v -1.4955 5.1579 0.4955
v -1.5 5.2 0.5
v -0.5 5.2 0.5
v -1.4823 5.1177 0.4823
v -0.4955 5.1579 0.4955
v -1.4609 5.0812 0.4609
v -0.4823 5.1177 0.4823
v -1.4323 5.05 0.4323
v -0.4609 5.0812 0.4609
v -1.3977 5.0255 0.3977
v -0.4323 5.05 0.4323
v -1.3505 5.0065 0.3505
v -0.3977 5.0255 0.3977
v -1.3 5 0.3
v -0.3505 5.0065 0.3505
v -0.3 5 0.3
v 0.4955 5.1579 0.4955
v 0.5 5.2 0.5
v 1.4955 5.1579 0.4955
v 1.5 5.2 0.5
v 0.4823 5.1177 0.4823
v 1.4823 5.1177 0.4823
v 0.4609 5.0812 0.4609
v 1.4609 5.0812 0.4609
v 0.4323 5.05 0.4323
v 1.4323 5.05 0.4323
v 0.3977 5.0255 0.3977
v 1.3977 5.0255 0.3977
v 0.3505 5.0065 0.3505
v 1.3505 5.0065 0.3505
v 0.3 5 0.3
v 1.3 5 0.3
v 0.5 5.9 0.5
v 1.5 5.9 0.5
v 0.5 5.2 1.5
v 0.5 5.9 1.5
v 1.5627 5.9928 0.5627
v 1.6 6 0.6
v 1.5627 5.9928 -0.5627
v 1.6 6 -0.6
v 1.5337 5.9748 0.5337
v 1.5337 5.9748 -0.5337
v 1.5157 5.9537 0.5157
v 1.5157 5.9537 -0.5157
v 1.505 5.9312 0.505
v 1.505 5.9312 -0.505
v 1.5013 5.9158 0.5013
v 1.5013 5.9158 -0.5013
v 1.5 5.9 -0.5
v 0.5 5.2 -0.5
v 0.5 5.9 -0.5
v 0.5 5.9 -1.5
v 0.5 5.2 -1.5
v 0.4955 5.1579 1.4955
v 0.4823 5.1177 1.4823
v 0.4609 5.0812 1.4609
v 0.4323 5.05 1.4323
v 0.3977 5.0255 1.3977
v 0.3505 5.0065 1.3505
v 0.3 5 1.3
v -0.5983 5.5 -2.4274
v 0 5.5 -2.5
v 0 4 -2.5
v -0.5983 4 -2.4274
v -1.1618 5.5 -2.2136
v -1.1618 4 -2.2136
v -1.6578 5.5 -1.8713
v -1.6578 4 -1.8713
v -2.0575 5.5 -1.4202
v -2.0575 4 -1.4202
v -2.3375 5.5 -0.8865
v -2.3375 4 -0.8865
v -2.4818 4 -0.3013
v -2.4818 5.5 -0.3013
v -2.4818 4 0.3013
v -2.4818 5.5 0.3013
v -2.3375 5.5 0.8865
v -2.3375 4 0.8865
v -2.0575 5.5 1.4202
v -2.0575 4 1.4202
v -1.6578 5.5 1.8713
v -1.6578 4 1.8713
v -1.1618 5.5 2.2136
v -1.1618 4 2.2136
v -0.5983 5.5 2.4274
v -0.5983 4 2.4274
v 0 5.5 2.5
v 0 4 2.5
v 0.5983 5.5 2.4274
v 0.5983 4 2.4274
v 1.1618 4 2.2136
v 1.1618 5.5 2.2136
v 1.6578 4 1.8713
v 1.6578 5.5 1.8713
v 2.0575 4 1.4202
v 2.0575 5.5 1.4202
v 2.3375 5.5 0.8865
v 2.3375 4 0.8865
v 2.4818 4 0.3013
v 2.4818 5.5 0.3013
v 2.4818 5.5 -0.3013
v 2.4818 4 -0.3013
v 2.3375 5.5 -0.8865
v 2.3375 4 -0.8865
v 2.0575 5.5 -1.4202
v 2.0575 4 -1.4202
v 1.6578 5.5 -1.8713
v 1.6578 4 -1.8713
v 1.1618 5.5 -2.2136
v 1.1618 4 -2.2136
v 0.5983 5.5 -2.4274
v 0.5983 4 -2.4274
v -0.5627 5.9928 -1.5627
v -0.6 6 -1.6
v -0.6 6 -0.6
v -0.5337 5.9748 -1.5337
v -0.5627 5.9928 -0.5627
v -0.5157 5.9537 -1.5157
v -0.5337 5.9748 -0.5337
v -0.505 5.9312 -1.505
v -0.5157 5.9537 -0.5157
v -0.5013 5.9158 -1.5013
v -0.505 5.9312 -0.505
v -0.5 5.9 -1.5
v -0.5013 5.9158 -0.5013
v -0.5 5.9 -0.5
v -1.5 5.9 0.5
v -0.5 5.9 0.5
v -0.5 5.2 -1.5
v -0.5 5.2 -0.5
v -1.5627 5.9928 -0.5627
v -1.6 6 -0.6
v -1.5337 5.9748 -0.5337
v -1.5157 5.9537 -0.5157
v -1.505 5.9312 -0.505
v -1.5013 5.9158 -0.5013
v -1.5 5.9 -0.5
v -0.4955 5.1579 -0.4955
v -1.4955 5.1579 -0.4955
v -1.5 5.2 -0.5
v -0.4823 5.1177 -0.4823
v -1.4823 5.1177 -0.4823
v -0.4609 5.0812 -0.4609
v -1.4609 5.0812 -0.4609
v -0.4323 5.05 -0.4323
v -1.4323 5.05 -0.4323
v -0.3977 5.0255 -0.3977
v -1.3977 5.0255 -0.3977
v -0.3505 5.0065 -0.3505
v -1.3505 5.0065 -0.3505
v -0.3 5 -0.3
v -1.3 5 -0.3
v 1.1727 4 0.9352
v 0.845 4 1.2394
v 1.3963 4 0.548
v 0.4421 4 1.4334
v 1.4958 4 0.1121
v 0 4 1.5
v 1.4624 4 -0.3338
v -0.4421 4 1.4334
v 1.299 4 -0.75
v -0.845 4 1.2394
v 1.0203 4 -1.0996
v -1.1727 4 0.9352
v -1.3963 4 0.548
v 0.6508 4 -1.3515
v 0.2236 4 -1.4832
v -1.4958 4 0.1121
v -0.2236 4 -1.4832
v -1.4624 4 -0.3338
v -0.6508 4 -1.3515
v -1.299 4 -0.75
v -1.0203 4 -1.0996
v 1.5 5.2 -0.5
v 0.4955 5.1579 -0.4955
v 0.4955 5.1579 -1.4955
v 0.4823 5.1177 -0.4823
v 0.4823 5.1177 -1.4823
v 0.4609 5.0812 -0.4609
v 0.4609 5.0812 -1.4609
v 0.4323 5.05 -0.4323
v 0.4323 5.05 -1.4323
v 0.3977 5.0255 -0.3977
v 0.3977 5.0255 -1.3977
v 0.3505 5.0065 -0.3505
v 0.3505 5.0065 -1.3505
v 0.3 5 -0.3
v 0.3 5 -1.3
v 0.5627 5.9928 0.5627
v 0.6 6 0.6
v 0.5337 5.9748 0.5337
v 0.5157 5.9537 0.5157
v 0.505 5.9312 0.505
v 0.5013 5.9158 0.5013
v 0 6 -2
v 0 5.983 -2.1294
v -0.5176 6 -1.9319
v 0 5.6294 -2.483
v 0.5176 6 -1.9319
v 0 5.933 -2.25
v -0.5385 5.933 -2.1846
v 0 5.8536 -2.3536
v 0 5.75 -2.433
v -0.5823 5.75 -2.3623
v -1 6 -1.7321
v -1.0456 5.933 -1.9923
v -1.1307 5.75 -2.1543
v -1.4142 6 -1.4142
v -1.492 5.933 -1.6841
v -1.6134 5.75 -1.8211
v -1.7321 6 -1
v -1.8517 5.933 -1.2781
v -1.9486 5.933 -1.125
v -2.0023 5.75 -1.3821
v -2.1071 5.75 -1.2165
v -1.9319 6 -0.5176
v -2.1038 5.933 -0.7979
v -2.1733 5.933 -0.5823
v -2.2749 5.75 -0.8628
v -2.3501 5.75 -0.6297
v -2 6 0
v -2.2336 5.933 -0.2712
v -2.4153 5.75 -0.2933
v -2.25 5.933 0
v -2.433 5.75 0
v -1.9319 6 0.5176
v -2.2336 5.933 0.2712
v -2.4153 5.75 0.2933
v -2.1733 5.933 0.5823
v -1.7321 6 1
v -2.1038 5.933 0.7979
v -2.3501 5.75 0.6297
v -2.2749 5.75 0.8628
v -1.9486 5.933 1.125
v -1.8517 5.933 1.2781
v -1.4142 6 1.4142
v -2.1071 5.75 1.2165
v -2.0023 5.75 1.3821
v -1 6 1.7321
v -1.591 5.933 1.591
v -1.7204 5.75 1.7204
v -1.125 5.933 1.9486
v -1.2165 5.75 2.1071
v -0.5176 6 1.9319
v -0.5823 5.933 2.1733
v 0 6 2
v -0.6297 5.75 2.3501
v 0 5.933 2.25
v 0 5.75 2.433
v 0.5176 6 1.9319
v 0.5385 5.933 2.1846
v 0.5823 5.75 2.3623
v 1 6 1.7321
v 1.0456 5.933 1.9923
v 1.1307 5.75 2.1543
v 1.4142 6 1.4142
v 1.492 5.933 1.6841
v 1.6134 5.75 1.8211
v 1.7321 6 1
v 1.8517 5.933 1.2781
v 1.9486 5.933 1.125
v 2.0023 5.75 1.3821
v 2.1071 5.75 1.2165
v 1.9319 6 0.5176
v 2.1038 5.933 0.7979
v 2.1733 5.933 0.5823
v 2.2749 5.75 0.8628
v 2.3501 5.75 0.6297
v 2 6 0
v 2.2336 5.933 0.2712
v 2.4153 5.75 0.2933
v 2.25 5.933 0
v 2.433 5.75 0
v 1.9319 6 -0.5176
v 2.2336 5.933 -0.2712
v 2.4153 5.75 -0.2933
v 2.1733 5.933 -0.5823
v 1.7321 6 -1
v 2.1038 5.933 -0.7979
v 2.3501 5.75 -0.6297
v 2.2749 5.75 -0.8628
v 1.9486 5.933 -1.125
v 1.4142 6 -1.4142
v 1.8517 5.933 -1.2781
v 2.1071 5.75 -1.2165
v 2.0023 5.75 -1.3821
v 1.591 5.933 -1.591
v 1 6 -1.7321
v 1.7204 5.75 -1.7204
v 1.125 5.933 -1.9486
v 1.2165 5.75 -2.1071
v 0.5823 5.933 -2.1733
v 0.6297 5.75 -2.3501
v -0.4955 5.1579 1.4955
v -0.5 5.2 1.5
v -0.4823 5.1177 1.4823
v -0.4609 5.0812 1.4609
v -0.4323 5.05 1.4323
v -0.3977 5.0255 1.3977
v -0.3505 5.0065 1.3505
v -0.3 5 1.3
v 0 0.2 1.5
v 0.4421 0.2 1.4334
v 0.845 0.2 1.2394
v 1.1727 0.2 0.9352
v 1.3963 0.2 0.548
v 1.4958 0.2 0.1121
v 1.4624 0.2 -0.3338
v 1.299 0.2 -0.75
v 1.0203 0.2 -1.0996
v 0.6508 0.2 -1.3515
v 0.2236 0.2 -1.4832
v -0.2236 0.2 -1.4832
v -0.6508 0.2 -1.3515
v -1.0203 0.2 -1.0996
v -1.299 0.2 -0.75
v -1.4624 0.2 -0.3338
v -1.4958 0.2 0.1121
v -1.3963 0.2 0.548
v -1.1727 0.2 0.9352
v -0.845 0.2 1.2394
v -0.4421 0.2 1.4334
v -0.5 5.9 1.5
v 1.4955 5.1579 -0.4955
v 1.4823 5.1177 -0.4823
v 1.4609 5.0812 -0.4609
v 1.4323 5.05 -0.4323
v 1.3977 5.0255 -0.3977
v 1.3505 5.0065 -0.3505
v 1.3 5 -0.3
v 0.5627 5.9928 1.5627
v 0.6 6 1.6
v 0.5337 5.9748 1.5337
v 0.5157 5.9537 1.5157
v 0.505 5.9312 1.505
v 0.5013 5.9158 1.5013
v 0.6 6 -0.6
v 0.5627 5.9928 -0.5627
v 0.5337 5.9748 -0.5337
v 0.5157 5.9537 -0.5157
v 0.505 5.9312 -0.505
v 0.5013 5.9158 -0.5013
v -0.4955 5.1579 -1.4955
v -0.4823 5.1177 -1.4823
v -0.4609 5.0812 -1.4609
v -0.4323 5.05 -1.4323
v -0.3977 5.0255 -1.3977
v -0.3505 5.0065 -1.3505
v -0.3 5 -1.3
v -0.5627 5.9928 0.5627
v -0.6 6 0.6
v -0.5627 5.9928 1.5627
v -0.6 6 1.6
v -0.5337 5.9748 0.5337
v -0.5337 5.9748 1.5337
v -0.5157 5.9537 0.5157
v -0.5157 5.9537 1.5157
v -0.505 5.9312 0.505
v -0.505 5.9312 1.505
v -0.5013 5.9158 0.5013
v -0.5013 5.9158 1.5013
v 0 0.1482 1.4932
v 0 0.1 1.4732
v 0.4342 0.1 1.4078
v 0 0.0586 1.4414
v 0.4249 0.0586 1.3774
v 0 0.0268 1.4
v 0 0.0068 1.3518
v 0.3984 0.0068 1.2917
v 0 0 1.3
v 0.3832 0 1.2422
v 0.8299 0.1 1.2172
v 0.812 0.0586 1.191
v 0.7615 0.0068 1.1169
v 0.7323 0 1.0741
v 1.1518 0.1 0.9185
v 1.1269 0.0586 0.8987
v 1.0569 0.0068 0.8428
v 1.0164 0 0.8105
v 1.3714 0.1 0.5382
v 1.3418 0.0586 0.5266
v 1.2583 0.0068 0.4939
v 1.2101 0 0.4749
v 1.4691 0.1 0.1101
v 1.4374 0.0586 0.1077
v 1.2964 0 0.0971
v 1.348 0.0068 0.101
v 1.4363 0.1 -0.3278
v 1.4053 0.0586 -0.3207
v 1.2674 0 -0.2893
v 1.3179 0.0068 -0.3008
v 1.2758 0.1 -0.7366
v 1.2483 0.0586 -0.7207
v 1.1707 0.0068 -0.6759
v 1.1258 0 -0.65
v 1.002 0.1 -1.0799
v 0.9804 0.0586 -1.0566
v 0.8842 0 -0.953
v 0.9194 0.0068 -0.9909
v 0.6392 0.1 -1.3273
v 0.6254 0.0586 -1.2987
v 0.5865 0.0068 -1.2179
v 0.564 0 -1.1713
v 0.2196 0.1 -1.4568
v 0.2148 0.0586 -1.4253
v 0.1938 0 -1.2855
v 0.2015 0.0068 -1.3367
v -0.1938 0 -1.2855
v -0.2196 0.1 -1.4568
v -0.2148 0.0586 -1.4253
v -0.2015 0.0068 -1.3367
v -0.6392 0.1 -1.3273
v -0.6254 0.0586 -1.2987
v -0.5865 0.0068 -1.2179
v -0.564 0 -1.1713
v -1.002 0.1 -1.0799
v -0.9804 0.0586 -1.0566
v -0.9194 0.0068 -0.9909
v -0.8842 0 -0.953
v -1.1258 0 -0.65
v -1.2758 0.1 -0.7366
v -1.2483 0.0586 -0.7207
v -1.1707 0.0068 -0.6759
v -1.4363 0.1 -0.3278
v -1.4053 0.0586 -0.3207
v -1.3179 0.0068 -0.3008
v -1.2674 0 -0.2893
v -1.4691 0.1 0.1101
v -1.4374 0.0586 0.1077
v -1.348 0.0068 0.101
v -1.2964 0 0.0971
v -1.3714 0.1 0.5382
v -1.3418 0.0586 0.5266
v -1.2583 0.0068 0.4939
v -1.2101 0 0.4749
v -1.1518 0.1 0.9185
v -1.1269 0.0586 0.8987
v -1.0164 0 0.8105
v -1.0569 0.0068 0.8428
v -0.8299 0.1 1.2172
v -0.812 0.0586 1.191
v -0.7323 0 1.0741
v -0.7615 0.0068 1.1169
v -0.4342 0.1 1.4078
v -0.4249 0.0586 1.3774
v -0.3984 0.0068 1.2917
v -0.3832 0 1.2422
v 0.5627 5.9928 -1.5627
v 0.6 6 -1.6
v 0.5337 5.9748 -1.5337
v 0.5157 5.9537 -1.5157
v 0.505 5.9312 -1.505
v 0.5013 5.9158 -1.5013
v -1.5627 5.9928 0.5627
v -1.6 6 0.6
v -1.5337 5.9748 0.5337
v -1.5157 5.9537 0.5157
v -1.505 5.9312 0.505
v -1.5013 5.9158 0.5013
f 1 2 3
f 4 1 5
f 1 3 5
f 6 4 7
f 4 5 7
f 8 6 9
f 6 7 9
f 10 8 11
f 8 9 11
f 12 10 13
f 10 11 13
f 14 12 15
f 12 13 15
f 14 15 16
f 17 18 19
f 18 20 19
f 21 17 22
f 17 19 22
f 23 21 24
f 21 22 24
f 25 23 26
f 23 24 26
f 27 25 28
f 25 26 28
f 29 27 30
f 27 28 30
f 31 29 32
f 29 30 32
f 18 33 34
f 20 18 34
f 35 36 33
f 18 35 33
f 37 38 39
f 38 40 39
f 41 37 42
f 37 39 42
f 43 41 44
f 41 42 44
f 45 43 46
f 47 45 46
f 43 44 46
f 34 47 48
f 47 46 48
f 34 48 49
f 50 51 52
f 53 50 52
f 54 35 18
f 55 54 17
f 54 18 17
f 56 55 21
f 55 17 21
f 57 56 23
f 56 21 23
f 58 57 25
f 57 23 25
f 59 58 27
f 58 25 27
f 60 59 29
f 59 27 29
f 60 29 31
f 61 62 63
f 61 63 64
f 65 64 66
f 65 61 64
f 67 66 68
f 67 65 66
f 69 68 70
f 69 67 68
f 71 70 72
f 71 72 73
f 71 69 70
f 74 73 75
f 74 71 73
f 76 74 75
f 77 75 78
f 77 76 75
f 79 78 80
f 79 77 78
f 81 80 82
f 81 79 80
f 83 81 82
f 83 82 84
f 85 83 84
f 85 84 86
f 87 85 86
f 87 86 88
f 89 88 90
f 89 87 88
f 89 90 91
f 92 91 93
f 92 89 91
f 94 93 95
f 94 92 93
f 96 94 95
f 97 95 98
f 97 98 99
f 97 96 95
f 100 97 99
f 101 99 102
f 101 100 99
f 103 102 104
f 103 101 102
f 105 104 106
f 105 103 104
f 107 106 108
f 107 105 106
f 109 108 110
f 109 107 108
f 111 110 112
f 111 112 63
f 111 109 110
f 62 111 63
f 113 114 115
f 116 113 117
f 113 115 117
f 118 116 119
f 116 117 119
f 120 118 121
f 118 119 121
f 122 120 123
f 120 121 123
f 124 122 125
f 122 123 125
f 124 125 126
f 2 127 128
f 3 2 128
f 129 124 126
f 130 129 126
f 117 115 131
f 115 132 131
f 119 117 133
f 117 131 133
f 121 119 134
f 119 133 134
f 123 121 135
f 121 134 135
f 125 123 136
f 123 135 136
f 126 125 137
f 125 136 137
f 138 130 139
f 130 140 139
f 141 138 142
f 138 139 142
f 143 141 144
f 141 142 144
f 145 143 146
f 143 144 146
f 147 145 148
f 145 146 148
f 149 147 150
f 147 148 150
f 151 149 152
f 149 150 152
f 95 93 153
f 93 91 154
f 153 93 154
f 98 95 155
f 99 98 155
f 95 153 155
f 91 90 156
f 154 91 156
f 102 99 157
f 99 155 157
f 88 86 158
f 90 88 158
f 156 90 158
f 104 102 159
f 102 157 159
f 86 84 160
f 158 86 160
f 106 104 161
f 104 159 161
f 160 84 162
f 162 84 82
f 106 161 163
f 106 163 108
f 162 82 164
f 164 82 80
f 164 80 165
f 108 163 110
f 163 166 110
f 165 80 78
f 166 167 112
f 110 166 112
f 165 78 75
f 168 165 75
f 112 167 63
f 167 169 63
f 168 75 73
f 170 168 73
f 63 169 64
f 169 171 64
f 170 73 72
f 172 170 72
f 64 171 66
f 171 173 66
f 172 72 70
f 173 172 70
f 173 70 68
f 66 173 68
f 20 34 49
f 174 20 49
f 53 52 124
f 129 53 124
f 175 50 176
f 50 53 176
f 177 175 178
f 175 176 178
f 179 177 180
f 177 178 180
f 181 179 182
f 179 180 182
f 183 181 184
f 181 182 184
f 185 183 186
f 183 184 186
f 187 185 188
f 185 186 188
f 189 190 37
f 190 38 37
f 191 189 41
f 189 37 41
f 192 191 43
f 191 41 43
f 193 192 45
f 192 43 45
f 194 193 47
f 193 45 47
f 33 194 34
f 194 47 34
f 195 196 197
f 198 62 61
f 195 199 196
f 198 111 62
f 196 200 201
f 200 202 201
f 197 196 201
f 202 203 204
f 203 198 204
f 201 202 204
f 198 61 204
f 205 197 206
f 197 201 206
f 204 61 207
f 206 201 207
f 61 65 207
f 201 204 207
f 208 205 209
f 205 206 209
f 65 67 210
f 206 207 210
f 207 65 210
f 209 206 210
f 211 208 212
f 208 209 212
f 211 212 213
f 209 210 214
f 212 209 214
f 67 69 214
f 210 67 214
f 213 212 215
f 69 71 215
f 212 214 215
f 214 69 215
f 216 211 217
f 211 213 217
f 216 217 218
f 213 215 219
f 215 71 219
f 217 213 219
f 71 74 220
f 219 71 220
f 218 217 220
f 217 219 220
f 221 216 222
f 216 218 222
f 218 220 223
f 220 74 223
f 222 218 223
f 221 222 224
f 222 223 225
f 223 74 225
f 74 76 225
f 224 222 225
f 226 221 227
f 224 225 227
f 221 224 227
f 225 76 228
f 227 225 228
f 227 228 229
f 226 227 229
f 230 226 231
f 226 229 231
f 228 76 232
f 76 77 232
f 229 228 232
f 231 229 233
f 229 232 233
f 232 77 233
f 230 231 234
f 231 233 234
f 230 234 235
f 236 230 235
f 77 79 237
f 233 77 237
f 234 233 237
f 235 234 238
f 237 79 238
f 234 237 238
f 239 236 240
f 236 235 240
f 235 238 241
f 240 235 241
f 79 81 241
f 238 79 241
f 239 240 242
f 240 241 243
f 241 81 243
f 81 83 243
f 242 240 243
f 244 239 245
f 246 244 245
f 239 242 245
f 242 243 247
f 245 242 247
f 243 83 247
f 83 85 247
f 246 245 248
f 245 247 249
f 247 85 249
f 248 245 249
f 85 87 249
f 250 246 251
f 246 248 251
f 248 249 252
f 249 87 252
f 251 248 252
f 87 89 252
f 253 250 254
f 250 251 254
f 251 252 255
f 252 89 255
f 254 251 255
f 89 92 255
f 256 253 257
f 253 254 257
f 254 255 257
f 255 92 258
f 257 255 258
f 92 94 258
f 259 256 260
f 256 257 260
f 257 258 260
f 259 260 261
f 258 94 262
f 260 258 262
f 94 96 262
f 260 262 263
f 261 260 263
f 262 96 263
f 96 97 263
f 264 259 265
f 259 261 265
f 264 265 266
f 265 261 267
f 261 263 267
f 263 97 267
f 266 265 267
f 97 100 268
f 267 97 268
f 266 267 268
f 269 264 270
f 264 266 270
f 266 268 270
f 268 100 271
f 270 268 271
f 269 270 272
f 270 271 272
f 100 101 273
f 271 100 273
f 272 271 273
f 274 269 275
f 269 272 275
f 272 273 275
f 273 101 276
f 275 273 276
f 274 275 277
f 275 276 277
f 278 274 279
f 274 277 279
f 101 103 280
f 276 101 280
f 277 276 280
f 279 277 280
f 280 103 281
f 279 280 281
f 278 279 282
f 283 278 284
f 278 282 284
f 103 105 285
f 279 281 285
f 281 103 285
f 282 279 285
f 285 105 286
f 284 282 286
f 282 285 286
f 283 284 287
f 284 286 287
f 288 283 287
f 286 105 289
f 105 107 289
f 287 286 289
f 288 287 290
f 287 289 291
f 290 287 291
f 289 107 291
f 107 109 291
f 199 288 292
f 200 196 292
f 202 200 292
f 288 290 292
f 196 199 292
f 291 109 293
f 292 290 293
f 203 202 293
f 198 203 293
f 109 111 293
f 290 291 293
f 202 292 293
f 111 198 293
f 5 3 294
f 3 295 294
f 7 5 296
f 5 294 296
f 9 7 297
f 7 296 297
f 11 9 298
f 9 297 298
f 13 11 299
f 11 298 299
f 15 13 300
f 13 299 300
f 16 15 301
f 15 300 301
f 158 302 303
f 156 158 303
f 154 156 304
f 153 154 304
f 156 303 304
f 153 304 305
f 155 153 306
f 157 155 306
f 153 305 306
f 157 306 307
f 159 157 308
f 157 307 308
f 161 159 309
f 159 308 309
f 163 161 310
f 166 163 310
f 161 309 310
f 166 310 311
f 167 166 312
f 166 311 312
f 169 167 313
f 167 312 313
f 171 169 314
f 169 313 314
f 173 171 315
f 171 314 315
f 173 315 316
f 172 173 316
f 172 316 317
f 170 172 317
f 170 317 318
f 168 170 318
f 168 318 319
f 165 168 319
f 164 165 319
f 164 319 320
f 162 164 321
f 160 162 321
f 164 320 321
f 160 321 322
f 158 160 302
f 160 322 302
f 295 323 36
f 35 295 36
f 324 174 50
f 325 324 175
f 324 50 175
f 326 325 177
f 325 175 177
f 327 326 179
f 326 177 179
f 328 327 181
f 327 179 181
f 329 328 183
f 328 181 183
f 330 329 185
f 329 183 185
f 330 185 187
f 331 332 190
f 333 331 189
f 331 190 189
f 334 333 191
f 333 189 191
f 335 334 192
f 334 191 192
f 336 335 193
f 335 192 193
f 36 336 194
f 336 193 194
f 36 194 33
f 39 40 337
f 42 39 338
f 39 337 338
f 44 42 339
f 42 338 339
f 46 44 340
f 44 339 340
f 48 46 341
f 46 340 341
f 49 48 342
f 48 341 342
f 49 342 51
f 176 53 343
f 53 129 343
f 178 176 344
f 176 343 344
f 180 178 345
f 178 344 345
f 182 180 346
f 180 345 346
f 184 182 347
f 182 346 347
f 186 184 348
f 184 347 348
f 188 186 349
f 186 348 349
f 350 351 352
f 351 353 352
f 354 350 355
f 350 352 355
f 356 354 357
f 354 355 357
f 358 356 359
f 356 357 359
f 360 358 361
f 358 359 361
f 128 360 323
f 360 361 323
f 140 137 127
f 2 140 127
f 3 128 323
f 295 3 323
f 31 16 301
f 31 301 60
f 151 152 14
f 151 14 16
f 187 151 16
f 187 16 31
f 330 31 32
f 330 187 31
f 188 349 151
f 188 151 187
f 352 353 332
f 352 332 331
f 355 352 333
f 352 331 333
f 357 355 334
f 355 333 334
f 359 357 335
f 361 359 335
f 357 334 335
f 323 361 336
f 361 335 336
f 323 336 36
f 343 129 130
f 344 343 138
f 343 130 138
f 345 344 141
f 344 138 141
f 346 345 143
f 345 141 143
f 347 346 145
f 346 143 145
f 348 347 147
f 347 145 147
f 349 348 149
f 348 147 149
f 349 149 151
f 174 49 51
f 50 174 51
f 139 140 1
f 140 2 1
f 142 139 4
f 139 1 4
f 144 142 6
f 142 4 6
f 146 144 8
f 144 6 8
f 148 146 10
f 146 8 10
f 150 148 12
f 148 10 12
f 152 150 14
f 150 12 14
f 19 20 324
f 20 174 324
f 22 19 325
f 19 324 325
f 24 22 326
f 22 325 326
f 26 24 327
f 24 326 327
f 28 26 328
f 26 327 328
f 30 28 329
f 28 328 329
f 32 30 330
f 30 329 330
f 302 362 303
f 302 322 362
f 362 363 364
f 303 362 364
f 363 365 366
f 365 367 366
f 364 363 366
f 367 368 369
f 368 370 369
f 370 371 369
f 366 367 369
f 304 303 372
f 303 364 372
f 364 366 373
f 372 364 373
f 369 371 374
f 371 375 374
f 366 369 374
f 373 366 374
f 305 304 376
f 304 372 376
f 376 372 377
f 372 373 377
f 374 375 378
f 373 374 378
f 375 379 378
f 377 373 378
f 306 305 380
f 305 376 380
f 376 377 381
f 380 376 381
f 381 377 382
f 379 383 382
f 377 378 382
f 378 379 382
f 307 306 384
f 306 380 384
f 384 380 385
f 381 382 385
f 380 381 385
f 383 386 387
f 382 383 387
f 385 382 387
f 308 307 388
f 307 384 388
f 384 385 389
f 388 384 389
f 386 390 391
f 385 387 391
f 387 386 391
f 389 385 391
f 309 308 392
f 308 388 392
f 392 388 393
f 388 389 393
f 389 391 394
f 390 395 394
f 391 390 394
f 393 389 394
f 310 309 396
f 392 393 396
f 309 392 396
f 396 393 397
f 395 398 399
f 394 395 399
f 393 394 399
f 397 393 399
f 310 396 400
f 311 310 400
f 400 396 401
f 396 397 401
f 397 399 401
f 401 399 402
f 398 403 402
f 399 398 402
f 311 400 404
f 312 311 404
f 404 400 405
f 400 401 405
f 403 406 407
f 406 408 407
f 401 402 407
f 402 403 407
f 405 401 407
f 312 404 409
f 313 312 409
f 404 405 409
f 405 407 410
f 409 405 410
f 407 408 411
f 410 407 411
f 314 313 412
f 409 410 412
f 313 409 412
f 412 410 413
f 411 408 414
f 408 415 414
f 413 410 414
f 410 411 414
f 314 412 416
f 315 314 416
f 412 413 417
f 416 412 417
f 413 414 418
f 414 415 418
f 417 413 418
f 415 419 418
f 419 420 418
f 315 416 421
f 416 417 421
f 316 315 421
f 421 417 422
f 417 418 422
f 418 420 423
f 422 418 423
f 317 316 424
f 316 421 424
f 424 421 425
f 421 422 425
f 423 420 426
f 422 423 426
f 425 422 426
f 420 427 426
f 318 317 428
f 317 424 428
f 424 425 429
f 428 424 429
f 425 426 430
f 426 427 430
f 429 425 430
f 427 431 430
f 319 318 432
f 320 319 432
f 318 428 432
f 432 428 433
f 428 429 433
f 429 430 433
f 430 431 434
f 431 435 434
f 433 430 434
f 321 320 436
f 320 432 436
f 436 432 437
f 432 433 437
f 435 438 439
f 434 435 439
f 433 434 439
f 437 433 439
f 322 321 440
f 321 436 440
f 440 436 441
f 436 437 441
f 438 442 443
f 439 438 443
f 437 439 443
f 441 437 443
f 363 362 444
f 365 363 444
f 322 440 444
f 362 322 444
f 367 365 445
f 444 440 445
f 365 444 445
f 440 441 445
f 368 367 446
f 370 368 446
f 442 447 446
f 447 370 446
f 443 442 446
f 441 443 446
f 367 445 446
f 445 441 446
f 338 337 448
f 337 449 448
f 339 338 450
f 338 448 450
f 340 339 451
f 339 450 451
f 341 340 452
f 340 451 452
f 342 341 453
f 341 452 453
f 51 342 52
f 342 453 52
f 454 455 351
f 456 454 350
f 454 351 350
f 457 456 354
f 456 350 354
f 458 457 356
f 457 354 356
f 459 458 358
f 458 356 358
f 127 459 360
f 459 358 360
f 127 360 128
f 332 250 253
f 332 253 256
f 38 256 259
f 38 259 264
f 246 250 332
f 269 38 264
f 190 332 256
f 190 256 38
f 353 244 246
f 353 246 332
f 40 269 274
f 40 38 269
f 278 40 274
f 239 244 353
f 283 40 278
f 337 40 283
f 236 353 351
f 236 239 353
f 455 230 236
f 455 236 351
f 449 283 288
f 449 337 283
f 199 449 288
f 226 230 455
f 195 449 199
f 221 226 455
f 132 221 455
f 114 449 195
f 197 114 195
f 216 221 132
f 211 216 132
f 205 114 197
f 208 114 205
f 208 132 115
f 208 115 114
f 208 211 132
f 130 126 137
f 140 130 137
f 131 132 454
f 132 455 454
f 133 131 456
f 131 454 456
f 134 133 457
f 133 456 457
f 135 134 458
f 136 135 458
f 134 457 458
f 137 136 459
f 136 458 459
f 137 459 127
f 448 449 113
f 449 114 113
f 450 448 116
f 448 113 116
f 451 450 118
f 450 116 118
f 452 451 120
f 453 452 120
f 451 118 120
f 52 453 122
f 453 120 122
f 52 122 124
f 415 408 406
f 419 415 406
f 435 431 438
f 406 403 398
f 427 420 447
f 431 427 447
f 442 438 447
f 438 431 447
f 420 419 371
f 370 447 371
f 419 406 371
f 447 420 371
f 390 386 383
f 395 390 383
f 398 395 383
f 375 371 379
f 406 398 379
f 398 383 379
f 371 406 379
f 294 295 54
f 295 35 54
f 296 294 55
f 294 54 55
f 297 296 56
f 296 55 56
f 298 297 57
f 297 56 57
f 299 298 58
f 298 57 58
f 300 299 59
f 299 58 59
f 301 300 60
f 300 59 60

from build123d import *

# Parameters (mm, degrees)
SKETCH1_R           = 1.5
BOSS_EXTRUDE1_DEPTH = 4
FILLET1_R           = 0.2
SKETCH2_W           = 2.5
SKETCH2_H           = 2
CUT_EXTRUDE1_DEPTH  = 1
FILLET3_R           = 0.1
FILLET4_R           = 0.2
FILLET5_R           = 0.5


with BuildPart() as part:
    # Sketch1 → Boss-Extrude1 (new body)
    with BuildSketch(Plane(origin=(0, 0, 0), x_dir=(1, 0, 0), z_dir=(0, 1, 0))):
        with Locations(Location((0, 0, 0), (0, 0, 270))):
            Circle(SKETCH1_R)
    extrude(amount=BOSS_EXTRUDE1_DEPTH)

    # Fillet1
    fillet1_edges = [part.edges().sort_by_distance(p)[0] for p in [
        (0, 0, -1.5),
    ]]
    fillet(fillet1_edges, radius=FILLET1_R)

    # Sketch2 → Revolve1 (revolve)
    with BuildSketch(Plane.XY, mode=Mode.PRIVATE) as revolve1_sk:
        with Locations((-1.25, 5)):
            Rectangle(SKETCH2_W, SKETCH2_H)
    revolve(revolve1_sk.sketch.rotate(Axis((0, 0, 0), (0, 1, 0)), 270), axis=Axis((0, 0, 0), (0, 1, 0)))

    # Sketch3 → Cut-Extrude1 (cut)
    with BuildSketch(Plane(origin=(0, 6, 0), x_dir=(1, 0, 0), z_dir=(0, 1, 0))):
        Polygon((-0.5, 0.5), (-1.5, 0.5), (-1.5, -0.5), (-0.5, -0.5), (-0.5, -1.5), (0.5, -1.5), (0.5, -0.5), (1.5, -0.5), (1.5, 0.5), (0.5, 0.5), (0.5, 1.5), (-0.5, 1.5), align=None)
    extrude(amount=-CUT_EXTRUDE1_DEPTH, mode=Mode.SUBTRACT)

    # Fillet3
    fillet3_edges = [part.edges().sort_by_distance(p)[0] for p in [
        (0.5, 6, 1),
        (1, 6, 0.5),
        (1.5, 6, 0),
        (1, 6, -0.5),
        (0.5, 6, -1),
        (0, 6, -1.5),
        (-0.5, 6, -1),
        (-1, 6, -0.5),
        (-1.5, 6, 0),
        (-1, 6, 0.5),
        (-0.5, 6, 1),
        (0, 6, 1.5),
    ]]
    fillet(fillet3_edges, radius=FILLET3_R)

    # Fillet4
    fillet4_edges = [part.edges().sort_by_distance(p)[0] for p in [
        (0.5, 5, 1),
        (0, 5, 1.5),
        (-0.5, 5, 1),
        (-1, 5, 0.5),
        (-1.5, 5, 0),
        (-1, 5, -0.5),
        (-0.5, 5, -1),
        (0, 5, -1.5),
        (0.5, 5, -1),
        (1, 5, -0.5),
        (1.5, 5, 0),
        (1, 5, 0.5),
    ]]
    fillet(fillet4_edges, radius=FILLET4_R)

    # Fillet5
    fillet5_edges = [part.edges().sort_by_distance(p)[0] for p in [
        (0, 6, 2.5),
    ]]
    fillet(fillet5_edges, radius=FILLET5_R)


solid = part.part
